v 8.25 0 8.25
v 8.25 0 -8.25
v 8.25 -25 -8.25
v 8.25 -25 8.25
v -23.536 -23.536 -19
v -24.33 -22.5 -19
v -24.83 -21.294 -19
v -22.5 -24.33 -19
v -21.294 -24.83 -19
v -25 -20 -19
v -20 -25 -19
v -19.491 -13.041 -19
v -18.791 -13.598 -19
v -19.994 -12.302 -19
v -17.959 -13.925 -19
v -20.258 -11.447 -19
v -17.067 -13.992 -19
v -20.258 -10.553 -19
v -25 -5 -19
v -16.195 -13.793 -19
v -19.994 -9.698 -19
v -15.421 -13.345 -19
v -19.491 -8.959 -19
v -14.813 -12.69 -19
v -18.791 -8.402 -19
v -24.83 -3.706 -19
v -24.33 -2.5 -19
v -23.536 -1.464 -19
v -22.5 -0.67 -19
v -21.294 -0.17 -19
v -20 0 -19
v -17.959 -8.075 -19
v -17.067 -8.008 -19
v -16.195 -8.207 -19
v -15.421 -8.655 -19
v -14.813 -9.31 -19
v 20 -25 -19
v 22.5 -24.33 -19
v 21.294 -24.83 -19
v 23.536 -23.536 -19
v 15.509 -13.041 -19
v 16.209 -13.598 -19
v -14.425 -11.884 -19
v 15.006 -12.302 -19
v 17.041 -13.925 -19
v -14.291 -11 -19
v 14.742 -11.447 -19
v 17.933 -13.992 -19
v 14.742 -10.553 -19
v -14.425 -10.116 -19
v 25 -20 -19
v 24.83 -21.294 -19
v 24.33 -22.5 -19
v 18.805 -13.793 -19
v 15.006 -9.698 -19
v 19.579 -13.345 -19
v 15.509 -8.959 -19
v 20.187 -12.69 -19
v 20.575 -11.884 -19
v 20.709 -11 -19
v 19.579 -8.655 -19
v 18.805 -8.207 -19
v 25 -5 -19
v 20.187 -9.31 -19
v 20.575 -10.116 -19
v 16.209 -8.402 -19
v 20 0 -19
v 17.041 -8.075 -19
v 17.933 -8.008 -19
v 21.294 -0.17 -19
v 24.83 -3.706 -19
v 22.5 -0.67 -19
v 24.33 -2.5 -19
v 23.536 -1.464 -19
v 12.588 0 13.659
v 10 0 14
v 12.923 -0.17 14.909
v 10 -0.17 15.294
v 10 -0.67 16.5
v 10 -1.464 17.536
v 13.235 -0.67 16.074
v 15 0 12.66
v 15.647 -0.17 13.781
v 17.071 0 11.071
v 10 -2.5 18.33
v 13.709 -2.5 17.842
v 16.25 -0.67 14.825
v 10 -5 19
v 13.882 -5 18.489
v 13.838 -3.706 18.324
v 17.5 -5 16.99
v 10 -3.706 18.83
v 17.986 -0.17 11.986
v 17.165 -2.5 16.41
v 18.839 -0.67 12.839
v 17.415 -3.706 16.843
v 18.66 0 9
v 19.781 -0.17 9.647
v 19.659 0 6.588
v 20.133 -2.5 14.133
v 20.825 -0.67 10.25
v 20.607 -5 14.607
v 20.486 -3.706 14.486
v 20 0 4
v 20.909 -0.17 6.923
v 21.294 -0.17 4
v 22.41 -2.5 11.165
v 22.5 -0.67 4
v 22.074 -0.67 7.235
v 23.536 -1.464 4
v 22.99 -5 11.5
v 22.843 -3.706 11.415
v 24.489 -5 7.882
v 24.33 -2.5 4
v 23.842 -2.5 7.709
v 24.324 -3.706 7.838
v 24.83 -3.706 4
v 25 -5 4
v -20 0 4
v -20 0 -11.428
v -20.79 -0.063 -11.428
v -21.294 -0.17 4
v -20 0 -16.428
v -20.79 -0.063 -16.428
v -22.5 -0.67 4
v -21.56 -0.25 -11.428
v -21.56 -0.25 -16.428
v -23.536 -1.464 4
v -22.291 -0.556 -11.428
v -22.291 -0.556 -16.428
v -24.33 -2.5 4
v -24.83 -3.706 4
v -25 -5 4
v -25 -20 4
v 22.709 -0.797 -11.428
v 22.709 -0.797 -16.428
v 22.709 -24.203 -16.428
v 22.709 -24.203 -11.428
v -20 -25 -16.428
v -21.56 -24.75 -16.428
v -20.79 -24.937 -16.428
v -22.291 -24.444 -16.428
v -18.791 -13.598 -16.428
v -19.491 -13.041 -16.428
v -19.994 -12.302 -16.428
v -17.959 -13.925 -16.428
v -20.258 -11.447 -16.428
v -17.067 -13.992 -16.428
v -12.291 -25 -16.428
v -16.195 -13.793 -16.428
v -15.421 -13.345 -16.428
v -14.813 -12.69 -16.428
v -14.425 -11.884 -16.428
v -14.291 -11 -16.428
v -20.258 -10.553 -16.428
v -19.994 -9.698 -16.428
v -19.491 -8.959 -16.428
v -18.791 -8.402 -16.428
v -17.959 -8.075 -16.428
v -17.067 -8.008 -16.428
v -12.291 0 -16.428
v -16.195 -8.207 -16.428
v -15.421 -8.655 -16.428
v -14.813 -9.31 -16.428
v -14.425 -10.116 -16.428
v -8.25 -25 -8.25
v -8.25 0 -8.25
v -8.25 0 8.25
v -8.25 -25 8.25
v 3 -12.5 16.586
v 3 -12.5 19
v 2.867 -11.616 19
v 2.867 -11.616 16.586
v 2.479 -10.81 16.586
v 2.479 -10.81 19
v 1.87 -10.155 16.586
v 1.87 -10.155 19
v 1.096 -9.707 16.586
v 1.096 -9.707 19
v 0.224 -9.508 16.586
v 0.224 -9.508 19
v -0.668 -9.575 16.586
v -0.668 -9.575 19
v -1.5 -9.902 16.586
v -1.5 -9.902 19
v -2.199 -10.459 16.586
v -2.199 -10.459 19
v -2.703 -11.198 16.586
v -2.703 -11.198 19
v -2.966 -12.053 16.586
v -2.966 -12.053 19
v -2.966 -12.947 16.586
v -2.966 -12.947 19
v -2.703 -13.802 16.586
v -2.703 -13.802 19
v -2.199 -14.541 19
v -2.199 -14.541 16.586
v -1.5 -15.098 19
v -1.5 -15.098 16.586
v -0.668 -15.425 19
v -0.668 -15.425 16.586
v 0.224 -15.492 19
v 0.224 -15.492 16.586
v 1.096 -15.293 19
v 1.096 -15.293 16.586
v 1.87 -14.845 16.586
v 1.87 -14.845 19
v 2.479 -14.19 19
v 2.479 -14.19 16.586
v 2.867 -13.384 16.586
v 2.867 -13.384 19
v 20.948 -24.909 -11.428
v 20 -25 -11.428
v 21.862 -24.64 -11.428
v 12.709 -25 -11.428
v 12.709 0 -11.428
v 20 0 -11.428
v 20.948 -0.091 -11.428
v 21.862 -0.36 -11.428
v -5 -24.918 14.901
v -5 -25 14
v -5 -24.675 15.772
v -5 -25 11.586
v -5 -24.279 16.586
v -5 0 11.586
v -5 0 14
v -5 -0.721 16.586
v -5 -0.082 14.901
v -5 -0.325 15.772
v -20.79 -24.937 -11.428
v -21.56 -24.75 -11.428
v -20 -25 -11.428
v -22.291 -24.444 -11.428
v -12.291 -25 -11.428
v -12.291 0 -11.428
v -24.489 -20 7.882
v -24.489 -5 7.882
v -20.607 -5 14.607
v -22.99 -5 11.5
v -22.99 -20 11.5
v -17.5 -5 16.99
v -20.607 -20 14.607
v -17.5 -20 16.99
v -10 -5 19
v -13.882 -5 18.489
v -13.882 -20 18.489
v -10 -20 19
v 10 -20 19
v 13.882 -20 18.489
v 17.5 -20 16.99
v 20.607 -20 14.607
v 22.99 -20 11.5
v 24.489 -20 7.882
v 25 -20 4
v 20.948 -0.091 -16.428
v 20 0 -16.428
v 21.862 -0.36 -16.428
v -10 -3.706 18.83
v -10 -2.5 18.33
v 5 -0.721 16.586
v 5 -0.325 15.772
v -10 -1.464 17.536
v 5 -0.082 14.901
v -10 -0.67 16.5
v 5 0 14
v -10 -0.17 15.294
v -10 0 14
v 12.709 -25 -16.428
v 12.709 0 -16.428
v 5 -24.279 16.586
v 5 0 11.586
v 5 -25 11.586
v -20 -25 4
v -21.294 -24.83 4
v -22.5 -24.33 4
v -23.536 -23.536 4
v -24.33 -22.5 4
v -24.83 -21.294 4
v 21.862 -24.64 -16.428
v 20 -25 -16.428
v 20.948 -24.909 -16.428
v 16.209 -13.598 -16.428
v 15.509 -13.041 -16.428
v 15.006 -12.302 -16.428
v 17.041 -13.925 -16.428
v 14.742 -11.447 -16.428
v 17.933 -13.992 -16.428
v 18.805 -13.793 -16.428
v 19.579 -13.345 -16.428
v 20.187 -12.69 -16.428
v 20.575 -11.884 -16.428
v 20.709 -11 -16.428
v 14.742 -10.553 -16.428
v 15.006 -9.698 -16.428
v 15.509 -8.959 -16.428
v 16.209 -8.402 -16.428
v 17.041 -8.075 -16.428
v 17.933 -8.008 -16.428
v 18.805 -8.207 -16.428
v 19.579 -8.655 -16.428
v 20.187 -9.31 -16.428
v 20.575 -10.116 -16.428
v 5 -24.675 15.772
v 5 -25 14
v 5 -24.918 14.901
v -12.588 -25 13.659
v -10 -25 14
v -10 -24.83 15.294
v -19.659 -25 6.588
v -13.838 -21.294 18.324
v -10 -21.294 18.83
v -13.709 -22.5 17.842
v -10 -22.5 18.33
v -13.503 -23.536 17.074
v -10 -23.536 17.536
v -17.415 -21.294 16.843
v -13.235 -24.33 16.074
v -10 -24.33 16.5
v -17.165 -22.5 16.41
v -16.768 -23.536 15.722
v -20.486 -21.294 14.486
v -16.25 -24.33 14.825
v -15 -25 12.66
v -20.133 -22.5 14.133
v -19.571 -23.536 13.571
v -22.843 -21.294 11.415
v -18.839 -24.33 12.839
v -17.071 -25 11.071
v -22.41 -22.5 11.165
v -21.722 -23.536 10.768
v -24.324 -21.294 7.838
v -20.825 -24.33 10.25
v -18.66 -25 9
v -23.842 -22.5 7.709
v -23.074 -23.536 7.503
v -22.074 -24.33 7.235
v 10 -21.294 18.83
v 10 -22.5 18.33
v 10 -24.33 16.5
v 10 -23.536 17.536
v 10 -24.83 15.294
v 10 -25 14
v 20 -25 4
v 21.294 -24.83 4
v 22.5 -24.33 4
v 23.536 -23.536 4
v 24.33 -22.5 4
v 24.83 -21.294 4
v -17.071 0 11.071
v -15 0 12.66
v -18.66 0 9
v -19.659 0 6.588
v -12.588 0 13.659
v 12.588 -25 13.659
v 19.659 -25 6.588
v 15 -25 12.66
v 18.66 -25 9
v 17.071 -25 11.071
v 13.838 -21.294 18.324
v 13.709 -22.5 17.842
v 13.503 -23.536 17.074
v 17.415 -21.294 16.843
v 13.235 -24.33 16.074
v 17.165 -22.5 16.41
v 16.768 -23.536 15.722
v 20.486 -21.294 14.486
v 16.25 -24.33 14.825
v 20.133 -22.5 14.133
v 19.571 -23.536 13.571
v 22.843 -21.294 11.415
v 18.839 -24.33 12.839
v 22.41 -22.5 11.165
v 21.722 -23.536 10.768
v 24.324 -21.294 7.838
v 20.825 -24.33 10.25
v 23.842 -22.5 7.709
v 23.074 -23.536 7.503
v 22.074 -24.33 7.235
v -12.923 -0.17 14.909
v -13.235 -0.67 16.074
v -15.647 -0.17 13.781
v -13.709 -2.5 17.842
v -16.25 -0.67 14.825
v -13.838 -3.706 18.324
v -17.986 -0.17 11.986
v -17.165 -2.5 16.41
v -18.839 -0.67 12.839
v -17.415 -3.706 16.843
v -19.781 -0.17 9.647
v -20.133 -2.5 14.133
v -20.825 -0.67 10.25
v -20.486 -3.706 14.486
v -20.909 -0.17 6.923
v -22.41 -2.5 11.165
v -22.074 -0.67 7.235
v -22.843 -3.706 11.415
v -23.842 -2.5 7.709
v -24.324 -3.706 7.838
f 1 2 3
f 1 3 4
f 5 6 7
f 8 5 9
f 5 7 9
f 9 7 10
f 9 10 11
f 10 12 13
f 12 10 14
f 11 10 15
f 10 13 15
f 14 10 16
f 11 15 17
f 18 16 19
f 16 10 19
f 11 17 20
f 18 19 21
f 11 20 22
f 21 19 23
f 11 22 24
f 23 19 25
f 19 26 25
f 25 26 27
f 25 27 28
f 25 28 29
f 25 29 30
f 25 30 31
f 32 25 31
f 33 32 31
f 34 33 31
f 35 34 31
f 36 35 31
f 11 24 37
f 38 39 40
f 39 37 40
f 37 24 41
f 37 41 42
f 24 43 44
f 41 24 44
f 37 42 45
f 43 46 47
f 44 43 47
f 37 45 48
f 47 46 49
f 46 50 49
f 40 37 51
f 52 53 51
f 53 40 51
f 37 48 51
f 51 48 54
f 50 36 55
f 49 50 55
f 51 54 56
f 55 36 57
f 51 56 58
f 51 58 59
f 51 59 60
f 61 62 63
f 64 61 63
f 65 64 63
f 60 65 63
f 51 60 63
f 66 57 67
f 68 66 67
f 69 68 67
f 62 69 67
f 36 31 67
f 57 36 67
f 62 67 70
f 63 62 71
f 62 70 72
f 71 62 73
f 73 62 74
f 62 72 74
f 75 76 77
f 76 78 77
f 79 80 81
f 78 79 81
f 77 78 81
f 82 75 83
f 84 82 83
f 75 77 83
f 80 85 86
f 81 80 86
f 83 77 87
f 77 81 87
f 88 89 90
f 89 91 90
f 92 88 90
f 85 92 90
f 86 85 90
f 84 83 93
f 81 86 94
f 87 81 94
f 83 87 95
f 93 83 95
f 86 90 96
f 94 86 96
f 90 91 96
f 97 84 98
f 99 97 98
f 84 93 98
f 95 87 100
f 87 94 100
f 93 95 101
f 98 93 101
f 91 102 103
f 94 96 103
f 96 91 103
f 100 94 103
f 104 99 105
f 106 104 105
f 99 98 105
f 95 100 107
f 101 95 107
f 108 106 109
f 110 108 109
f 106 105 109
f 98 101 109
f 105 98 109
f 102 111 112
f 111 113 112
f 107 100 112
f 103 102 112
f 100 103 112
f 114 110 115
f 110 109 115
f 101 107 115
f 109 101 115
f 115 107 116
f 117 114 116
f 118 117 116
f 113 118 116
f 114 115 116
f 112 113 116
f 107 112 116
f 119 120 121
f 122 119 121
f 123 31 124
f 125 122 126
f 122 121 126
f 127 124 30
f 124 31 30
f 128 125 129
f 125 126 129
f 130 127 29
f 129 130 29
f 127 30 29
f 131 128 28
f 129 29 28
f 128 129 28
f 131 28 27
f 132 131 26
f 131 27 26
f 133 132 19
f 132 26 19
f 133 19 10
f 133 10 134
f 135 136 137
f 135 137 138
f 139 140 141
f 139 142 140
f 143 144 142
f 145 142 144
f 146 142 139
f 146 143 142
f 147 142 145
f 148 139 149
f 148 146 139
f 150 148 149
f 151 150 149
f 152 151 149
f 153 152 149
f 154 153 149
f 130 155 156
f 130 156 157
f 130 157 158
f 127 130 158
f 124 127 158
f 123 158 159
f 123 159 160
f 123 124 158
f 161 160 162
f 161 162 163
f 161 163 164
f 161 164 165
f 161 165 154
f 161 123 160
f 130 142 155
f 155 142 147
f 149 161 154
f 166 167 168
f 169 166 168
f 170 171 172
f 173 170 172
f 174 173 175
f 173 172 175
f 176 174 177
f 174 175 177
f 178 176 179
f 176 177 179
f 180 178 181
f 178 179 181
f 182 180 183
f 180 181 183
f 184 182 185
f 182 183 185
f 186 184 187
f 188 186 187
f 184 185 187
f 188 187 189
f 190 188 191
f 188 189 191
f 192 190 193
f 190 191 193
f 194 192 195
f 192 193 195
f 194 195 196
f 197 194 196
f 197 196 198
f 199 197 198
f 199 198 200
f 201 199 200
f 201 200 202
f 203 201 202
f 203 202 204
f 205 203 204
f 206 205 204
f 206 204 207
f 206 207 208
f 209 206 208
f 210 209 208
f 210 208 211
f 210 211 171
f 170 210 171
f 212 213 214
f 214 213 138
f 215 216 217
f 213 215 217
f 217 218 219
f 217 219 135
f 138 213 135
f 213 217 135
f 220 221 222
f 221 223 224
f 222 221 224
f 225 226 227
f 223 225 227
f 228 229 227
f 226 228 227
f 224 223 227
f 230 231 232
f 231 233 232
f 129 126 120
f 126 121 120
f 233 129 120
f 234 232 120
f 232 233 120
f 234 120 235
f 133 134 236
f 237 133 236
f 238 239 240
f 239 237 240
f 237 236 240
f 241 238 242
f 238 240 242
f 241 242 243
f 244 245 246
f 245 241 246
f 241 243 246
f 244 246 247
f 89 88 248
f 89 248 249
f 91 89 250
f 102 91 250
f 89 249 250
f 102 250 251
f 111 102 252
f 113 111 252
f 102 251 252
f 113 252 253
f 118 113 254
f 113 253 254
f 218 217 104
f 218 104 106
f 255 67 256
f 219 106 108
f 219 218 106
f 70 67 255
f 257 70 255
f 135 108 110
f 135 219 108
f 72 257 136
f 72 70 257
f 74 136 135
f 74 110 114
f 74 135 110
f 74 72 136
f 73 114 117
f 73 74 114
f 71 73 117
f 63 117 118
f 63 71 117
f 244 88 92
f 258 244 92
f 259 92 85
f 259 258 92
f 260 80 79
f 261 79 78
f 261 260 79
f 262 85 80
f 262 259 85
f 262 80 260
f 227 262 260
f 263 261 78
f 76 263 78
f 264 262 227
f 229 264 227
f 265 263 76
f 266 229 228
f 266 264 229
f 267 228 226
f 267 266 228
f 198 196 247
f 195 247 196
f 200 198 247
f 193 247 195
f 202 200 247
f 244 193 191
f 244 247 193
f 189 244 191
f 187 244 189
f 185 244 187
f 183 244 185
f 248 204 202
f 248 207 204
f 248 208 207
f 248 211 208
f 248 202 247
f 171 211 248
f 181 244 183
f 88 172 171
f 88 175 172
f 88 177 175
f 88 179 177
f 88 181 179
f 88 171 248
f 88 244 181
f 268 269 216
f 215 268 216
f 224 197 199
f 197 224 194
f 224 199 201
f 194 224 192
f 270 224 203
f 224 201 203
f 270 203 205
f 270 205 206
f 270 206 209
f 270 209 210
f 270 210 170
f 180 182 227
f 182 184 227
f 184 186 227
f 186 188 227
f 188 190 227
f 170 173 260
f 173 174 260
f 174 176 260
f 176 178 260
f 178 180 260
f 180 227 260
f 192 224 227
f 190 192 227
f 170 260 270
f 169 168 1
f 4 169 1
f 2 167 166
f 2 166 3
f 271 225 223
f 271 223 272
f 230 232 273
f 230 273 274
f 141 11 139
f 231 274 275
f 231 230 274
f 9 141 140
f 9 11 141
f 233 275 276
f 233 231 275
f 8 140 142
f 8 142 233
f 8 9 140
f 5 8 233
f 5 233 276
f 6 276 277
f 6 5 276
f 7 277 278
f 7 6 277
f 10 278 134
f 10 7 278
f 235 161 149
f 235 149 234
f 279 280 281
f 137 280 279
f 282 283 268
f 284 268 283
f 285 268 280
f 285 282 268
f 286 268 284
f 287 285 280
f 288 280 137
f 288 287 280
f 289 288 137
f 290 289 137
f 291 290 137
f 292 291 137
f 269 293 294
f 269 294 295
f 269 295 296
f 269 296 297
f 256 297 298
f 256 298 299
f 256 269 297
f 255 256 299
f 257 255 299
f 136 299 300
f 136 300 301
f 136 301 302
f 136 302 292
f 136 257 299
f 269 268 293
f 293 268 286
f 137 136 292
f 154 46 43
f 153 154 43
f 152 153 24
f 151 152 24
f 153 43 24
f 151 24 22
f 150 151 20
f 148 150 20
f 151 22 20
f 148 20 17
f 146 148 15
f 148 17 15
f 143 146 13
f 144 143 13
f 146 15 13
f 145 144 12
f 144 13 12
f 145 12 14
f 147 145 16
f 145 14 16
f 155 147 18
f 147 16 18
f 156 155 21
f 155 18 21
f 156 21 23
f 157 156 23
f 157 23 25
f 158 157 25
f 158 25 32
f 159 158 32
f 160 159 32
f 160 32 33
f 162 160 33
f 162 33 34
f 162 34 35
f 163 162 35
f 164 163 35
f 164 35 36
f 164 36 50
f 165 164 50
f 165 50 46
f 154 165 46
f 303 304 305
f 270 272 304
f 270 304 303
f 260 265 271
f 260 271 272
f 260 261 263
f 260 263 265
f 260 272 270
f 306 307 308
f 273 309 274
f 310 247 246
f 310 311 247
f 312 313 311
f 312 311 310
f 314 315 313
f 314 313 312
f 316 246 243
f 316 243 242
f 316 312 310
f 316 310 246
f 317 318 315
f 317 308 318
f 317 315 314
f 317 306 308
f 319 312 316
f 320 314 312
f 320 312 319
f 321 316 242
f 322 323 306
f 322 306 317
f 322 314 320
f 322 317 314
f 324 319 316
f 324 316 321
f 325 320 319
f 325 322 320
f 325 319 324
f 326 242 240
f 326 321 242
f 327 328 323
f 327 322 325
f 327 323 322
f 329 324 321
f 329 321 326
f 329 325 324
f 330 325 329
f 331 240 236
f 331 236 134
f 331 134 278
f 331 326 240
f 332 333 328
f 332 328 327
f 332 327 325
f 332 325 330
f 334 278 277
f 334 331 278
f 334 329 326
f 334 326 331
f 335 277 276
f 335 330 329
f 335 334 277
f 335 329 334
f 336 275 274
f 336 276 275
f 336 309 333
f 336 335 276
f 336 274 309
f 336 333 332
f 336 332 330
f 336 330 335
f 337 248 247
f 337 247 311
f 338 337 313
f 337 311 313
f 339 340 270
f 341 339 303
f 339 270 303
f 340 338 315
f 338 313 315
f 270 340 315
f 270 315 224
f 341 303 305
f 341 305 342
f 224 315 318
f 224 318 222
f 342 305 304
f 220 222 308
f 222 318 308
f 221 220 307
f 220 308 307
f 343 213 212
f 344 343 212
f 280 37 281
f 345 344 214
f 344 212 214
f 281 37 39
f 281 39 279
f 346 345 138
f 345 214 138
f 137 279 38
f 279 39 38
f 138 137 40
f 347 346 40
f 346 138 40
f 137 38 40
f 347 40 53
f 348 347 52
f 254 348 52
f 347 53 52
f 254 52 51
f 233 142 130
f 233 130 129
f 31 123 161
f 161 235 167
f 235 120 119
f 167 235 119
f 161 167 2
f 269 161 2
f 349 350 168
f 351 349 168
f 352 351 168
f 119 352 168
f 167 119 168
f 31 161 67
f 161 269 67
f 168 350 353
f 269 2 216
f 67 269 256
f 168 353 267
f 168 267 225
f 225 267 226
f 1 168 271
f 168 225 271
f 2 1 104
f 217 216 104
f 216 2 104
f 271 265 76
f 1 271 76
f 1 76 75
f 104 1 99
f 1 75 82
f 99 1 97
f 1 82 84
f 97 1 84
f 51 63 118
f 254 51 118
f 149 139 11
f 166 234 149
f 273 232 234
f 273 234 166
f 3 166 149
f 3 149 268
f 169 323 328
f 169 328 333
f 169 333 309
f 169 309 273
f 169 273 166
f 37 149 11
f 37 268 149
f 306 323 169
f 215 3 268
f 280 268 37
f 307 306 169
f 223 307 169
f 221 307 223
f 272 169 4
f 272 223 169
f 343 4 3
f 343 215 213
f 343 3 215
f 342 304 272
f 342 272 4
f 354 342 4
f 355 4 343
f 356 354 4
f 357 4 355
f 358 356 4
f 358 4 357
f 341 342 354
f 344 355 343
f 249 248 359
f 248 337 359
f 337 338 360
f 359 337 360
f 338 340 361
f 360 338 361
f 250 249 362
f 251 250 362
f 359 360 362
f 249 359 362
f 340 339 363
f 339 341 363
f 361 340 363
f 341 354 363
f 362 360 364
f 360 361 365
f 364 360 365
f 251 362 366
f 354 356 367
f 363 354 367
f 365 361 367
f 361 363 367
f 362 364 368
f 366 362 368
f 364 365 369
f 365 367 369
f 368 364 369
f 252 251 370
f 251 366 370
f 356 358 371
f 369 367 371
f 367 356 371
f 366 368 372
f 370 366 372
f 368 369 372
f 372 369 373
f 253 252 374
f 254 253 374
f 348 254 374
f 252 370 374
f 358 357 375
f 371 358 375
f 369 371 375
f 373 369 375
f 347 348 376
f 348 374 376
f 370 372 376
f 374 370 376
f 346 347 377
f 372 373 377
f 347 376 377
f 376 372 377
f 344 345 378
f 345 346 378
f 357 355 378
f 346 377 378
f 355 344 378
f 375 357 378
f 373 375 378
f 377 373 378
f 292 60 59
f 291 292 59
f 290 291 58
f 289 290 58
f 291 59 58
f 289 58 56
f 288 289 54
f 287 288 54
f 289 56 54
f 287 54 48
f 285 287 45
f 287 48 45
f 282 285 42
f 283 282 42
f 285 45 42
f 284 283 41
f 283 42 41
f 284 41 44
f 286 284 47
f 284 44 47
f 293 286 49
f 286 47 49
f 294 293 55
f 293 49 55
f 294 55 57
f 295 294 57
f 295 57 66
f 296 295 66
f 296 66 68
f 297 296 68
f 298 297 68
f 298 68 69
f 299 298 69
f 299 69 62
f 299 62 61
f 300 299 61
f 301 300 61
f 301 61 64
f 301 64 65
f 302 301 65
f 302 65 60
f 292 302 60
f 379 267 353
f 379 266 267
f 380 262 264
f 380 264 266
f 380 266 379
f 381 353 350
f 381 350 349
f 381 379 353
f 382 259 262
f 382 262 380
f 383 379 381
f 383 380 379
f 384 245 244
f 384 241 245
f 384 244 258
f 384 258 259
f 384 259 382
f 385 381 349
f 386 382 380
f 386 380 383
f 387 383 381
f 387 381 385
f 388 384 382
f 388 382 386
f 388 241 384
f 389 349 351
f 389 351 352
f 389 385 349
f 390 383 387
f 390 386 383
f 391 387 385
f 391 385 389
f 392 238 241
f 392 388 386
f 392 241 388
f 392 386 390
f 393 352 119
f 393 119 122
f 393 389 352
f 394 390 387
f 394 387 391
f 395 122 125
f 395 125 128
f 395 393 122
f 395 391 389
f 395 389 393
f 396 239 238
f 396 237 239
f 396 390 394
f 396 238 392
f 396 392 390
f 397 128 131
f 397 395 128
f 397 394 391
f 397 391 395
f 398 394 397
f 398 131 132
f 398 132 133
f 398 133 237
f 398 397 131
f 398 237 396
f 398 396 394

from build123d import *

# Parameters (mm, degrees)
F0_W         = 50
F0_H         = 38
F0_W_2       = 10
F0_H_2       = 5
F0_W_3       = 16.5
F0_H_3       = 16.5
F1_DEPTH     = 25
F2_R         = 3
F3_DEPTH     = 7.4141664952
F4_R         = 3
F5_DEPTH     = 7.571767807
F6_R         = 15
F7_T1_DEPTH  = 35.5
F7_T3_DEPTH  = 20
F7_T6_ANGLE  = 90
F7_T8_ANGLE  = 90
F7_T10_ANGLE = 90
F7_T12_ANGLE = 90


# Not quite as in the source:
# - a fillet or chamfer that OpenCascade refuses, or shapes differently, is made with other operations: its cross-section is extruded or revolved along the edge and cut away or added


with BuildPart() as f1:
    # F0 (on Front) → F1 (new body)
    with BuildSketch(Plane.XZ):
        Rectangle(F0_W, F0_H)
        with Locations((-17.2914686799, -13.928232193)):
            Rectangle(F0_W_2, F0_H_2, mode=Mode.SUBTRACT)
        with Locations((17.7085313201, -13.928232193)):
            Rectangle(F0_W_2, F0_H_2, mode=Mode.SUBTRACT)
        Rectangle(F0_W_3, F0_H_3, mode=Mode.SUBTRACT)
        with Locations((0, 14.0858335048)):
            Rectangle(F0_W_2, F0_H_2, mode=Mode.SUBTRACT)
    extrude(amount=F1_DEPTH)

    # F2 (on face) → F3 (cut, through all)
    with BuildSketch(Plane.XY.offset(19)):
        with Locations((0, -12.5)):
            Circle(F2_R)
    extrude(amount=-F3_DEPTH, mode=Mode.SUBTRACT)

    # F4 (on face) → F5 (cut, through all)
    with BuildSketch(Plane(origin=(0, 0, -19), x_dir=(1, 0, 0), z_dir=(0, 0, -1))):
        with Locations((-17.2914686799, 11)):
            Circle(F4_R)
        with Locations((17.7085313201, 11)):
            Circle(F4_R)
    extrude(amount=-F5_DEPTH, mode=Mode.SUBTRACT)

    # F6
    f6_edges = [f1.edges().sort_by_distance(p)[0] for p in [
        (-25, -12.5, 19),
        (25, -12.5, 19),
    ]]
    fillet(f6_edges, radius=F6_R)

    # F7: fillet of radius 5 on 10 edges, made by hand

    # F7_s2 → F7_t1 (cut)
    with BuildSketch(Plane.XY.offset(-31.5)):
        with BuildLine():
            ThreePointArc((-20, 0), (-23.5355339059, -1.4644660941), (-25, -5))
            Line((-25, -5), (-25, 0))
            Line((-25, 0), (-20, 0))
        make_face()
        with BuildLine():
            ThreePointArc((20, 0), (23.5355339059, -1.4644660941), (25, -5))
            Line((25, -5), (25, 0))
            Line((25, 0), (20, 0))
        make_face()
        with BuildLine():
            ThreePointArc((20, -25), (23.5355339059, -23.5355339059), (25, -20))
            Line((25, -20), (25, -25))
            Line((25, -25), (20, -25))
        make_face()
        with BuildLine():
            ThreePointArc((-20, -25), (-23.5355339059, -23.5355339059), (-25, -20))
            Line((-25, -20), (-25, -25))
            Line((-25, -25), (-20, -25))
        make_face()
    extrude(amount=F7_T1_DEPTH, mode=Mode.SUBTRACT)

    # F7_s4 → F7_t3 (cut)
    with BuildSketch(Plane.YZ.offset(-10)):
        with BuildLine():
            ThreePointArc((-20, 19), (-23.5355339059, 17.5355339059), (-25, 14))
            Line((-25, 14), (-25, 19))
            Line((-25, 19), (-20, 19))
        make_face()
        with BuildLine():
            ThreePointArc((-5, 19), (-1.4644660941, 17.5355339059), (0, 14))
            Line((0, 14), (0, 19))
            Line((0, 19), (-5, 19))
        make_face()
    extrude(amount=F7_T3_DEPTH, mode=Mode.SUBTRACT)

    # F7_s5 → F7_t6 (revolve, cut)
    with BuildSketch(Plane.YZ.offset(-10)):
        with BuildLine():
            ThreePointArc((0, 14), (-1.4644660941, 17.5355339059), (-5, 19))
            Line((-5, 19), (0, 19))
            Line((0, 19), (0, 14))
        make_face()
    revolve(axis=Axis((-10, 0, 4), (0, -1, 0)), revolution_arc=F7_T6_ANGLE, mode=Mode.SUBTRACT)

    # F7_s7 → F7_t8 (revolve, cut)
    with BuildSketch(Plane.YZ.offset(10)):
        with BuildLine():
            ThreePointArc((0, 14), (-1.4644660941, 17.5355339059), (-5, 19))
            Line((-5, 19), (0, 19))
            Line((0, 19), (0, 14))
        make_face()
    revolve(axis=Axis((10, 0, 4), (0, 1, 0)), revolution_arc=F7_T8_ANGLE, mode=Mode.SUBTRACT)

    # F7_s9 → F7_t10 (revolve, cut)
    with BuildSketch(Plane.YZ.offset(10)):
        with BuildLine():
            ThreePointArc((-20, 19), (-23.5355339059, 17.5355339059), (-25, 14))
            Line((-25, 14), (-25, 19))
            Line((-25, 19), (-20, 19))
        make_face()
    revolve(axis=Axis((10, -25, 4), (0, 1, 0)), revolution_arc=F7_T10_ANGLE, mode=Mode.SUBTRACT)

    # F7_s11 → F7_t12 (revolve, cut)
    with BuildSketch(Plane.YZ.offset(-10)):
        with BuildLine():
            ThreePointArc((-20, 19), (-23.5355339059, 17.5355339059), (-25, 14))
            Line((-25, 14), (-25, 19))
            Line((-25, 19), (-20, 19))
        make_face()
    revolve(axis=Axis((-10, -25, 4), (0, -1, 0)), revolution_arc=F7_T12_ANGLE, mode=Mode.SUBTRACT)


solid = f1.part
